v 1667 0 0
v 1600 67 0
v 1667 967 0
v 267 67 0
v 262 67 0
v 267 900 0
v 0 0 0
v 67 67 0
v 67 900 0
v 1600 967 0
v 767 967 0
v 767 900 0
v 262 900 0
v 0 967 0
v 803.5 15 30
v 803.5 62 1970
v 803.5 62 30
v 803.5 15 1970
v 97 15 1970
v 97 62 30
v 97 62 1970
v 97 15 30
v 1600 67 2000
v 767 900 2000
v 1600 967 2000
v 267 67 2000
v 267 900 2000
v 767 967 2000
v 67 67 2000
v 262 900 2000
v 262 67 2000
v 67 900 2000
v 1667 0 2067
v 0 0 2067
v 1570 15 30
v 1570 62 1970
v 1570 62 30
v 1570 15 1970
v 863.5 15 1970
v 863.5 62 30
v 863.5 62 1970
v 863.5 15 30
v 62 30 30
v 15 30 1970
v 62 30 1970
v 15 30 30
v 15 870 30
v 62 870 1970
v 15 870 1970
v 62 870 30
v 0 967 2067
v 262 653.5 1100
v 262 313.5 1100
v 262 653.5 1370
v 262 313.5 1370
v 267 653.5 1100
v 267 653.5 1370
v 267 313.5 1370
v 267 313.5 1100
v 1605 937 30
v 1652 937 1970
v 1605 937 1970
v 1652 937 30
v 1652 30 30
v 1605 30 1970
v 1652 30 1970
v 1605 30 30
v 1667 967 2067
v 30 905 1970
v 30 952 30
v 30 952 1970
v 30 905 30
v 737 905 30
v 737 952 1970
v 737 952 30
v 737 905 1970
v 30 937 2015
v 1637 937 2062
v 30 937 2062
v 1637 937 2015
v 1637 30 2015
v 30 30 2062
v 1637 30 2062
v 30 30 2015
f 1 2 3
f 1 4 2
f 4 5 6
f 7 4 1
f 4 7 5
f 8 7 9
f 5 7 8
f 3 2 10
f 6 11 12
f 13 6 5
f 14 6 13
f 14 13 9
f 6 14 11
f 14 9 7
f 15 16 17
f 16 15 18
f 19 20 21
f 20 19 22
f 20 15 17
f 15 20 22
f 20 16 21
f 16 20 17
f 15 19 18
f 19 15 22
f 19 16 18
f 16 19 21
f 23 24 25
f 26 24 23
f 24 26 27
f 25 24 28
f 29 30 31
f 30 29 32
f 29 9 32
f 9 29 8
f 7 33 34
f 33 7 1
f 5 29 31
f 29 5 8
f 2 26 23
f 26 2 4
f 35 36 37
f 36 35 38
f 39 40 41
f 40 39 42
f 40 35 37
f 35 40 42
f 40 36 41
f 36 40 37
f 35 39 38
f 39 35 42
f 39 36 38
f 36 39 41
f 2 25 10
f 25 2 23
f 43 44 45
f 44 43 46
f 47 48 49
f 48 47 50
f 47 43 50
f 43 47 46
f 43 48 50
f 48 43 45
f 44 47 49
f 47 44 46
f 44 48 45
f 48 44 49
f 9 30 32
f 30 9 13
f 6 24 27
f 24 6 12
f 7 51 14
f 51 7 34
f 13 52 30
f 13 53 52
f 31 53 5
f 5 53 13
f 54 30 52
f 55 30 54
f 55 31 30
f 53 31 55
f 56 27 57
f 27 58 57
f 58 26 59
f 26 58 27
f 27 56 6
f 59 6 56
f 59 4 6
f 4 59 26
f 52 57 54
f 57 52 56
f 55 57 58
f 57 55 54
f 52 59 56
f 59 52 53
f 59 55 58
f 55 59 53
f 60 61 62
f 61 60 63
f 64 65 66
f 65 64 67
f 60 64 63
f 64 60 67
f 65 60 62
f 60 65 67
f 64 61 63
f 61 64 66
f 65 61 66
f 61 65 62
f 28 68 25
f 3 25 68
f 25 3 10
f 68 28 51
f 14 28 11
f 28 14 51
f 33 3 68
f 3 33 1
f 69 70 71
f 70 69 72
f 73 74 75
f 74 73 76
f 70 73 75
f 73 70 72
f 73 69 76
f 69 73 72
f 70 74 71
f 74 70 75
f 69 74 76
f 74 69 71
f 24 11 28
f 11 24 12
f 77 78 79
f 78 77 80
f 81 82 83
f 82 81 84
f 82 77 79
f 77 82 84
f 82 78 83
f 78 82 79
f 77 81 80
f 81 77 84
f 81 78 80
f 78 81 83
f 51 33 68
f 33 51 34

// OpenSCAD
/* Modélisation Cabine gueulomaton 
Les dimensions sont en mm */ 

/* Dimension des éléments de bois */
epaisTasseau1 = 47;
epaisTasseau2 = 30;
longCabine = 1600;
longPanneauEntree = 700;
largCabine = 900;
hautCabine = 2000;
epaisBois1 = 15; /* OSB */
epaisBois2 = 5;  /* CP */
largEcran = 340;
hautEcran = 270;
lExplose = 250;

/* Paramètres calculés */
epaisPanneau = epaisTasseau1 + epaisBois1 + epaisBois2; // épaisseur totale des panneaux
longPanneauxFond = longCabine - epaisPanneau; // longueur du fond de cabine

echo("Taille des tasseaux :", epaisTasseau1, epaisTasseau2);
echo("Epaisseur bois extérieur (OSB):", epaisBois1);
echo("Epaisseur bois intérieur (CP):", epaisBois2);
echo("Epaisseur d'un panneaux :", epaisPanneau, "mm");
echo("Epaisseur des 6 panneaux posés à plat (rangement):", 6*epaisPanneau, "mm");

/* Création de la cabine */
translate([epaisPanneau,0,0]) GueulomatonMonte();

/* Cabine explosée */
//translate([epaisPanneau,0,0]) GueulomatonExplose();

/* Cabine explosée avec repli du fond */
//translate([-3000,0,0]) GueulomatonExplose(-45);

/* Cabine à plat */
//translate([0,-3000,0]) rotate([90,0,90]) GueulomatonAPlat();

module GueulomatonMonte(bToit=true) {
    // Panneaux
    echo("Panneaux du fond pliables : longueur ", longPanneauxFond*0.5, "mm");
    cadrePanneau(longPanneauxFond*0.5, hautCabine);
    translate([longPanneauxFond*0.5, 0,0]) cadrePanneau(longPanneauxFond*0.5, hautCabine);
    rotate([0,0,90]) {
        echo("Panneau derrière écran :");
        rotate([0,0,180]) translate([-largCabine,-epaisPanneau,0]) cadrePanneau(largCabine, hautCabine);
        
        echo("Panneau intérieur:");
        translate([epaisPanneau,-200,0]) panneauInterieur(largCabine-epaisPanneau, hautCabine);
        
        echo("Panneau Arrière plan photo :");
        translate([0,-longCabine,0]) cadrePanneau(largCabine+epaisPanneau, hautCabine);
    }
    echo("Panneau devant entrée :");
    translate([longPanneauEntree,largCabine+epaisPanneau,0]) 
        rotate([0,0,180]) cadrePanneau(longPanneauEntree+epaisPanneau, hautCabine);
    
    // Toit
    if (bToit) {
        echo("Panneau du toit:");
        translate([-epaisPanneau,0,hautCabine]) rotate([90,0,90]) 
            cadrePanneau(largCabine+epaisPanneau, longCabine+epaisPanneau);
    }
}


module GueulomatonExplose(angPli=0) {
    // Panneaux du fond pliables
    translate([0,longPanneauxFond*0.5*sin(angPli)-lExplose,0]) {
    translate([longPanneauxFond*0.5*(1-cos(angPli))+epaisPanneau*sin(angPli), 
        -longPanneauxFond*0.5*sin(angPli),0]) 
        rotate([0,0,angPli]) cadrePanneau(longPanneauxFond*0.5, hautCabine);
    translate([longPanneauxFond*0.5-epaisPanneau*sin(angPli), 0,0]) 
        rotate([0,0,-angPli]) cadrePanneau(longPanneauxFond*0.5, hautCabine);
    };
    rotate([0,0,90]) {
        //Panneau derrière écran
        translate([epaisPanneau,lExplose,0]) cadrePanneau(largCabine, hautCabine);
        
        //Panneau intérieur
        translate([epaisPanneau,-200,0]) panneauInterieur(largCabine-epaisPanneau, hautCabine);
        
        //Panneau Arrière plan photo
        translate([0,-longCabine,0]) cadrePanneau(largCabine+epaisPanneau, hautCabine);
    }
    //Panneau devant entrée
    translate([longPanneauEntree,largCabine+epaisPanneau+lExplose,0]) 
        rotate([0,0,180]) 
        cadrePanneau(longPanneauEntree+epaisPanneau, hautCabine);
    
    //Panneau du toit
    translate([-epaisPanneau,0,hautCabine+lExplose]) rotate([90,0,90]) 
        cadrePanneau(largCabine+epaisPanneau, longCabine+epaisPanneau);
}

module GueulomatonAPlat() {
    esp = 5;
    // Panneaux du fond pliables
    cadrePanneau(longPanneauxFond*0.5, hautCabine);
    translate([0,epaisPanneau+1,0]) cadrePanneau(longPanneauxFond*0.5, hautCabine);
    
    // Panneau devant entrée 
    translate([0,4*(epaisPanneau+esp)+(epaisBois2+esp),0]) cadrePanneau(longPanneauEntree+epaisPanneau, hautCabine);
    
    // Panneau intérieur
    translate([0,2*(epaisPanneau+esp),0]) panneauInterieur(largCabine-epaisPanneau, hautCabine);
    // Panneau derrière écran 
    translate([0,2*(epaisPanneau+esp)+(epaisBois2+esp),0]) cadrePanneau(largCabine, hautCabine);
        
        
    // Panneau Arrière plan photo
    translate([0,3*(epaisPanneau+esp)+(epaisBois2+esp),0]) cadrePanneau(largCabine+epaisPanneau, hautCabine);
        
    // Toit
    translate([0,5*(epaisPanneau+esp)+(epaisBois2+esp),0]) cadrePanneau(largCabine+epaisPanneau, longCabine+epaisPanneau);

}


/** Modules */
module panneauInterieur(larg, haut) {
    difference() {
        echo("Taille du panneau :", larg, haut); 
        color("orange") cube([larg,epaisBois2,haut]);
        translate([0.5*(larg-largEcran),-1,1100]) cube([largEcran,epaisBois1+2,hautEcran]);
    }
}

/* Cadre d'un panneau : 4 tasseaux */
module cadrePanneau(larg, haut,bEcho=true) {
    if (bEcho==true) { echo("Taille du panneau :", larg, haut); }
    translate([0,epaisBois1,0]) union() {
        // Tasseaux verticaux
        tasseau(haut);
        translate([larg-epaisTasseau2,0,0]) tasseau(haut);
        // Tasseaux horizontaux
        lT = larg-2*epaisTasseau2;
        if (bEcho==true) { echo("2 tasseaux coupés à ",lT); }
        color("gold") translate([epaisTasseau2,0,epaisTasseau2]) rotate([0,90,0]) {
             tasseau(lT);
             translate([-haut+epaisTasseau2,0,0]) tasseau(lT);
        }
        
        // Panneaux de bois 
        #color("white") translate([0,-epaisBois1,0])
            cube([larg,epaisBois1,haut]);
        #color("yellow") translate([0,epaisTasseau1,0])
            cube([larg,epaisBois2,haut]);
    }
}

/* Un tasseau hauteur paramétrable */
module tasseau(haut=2000)
{
    cube([epaisTasseau2, epaisTasseau1, haut]);
}
